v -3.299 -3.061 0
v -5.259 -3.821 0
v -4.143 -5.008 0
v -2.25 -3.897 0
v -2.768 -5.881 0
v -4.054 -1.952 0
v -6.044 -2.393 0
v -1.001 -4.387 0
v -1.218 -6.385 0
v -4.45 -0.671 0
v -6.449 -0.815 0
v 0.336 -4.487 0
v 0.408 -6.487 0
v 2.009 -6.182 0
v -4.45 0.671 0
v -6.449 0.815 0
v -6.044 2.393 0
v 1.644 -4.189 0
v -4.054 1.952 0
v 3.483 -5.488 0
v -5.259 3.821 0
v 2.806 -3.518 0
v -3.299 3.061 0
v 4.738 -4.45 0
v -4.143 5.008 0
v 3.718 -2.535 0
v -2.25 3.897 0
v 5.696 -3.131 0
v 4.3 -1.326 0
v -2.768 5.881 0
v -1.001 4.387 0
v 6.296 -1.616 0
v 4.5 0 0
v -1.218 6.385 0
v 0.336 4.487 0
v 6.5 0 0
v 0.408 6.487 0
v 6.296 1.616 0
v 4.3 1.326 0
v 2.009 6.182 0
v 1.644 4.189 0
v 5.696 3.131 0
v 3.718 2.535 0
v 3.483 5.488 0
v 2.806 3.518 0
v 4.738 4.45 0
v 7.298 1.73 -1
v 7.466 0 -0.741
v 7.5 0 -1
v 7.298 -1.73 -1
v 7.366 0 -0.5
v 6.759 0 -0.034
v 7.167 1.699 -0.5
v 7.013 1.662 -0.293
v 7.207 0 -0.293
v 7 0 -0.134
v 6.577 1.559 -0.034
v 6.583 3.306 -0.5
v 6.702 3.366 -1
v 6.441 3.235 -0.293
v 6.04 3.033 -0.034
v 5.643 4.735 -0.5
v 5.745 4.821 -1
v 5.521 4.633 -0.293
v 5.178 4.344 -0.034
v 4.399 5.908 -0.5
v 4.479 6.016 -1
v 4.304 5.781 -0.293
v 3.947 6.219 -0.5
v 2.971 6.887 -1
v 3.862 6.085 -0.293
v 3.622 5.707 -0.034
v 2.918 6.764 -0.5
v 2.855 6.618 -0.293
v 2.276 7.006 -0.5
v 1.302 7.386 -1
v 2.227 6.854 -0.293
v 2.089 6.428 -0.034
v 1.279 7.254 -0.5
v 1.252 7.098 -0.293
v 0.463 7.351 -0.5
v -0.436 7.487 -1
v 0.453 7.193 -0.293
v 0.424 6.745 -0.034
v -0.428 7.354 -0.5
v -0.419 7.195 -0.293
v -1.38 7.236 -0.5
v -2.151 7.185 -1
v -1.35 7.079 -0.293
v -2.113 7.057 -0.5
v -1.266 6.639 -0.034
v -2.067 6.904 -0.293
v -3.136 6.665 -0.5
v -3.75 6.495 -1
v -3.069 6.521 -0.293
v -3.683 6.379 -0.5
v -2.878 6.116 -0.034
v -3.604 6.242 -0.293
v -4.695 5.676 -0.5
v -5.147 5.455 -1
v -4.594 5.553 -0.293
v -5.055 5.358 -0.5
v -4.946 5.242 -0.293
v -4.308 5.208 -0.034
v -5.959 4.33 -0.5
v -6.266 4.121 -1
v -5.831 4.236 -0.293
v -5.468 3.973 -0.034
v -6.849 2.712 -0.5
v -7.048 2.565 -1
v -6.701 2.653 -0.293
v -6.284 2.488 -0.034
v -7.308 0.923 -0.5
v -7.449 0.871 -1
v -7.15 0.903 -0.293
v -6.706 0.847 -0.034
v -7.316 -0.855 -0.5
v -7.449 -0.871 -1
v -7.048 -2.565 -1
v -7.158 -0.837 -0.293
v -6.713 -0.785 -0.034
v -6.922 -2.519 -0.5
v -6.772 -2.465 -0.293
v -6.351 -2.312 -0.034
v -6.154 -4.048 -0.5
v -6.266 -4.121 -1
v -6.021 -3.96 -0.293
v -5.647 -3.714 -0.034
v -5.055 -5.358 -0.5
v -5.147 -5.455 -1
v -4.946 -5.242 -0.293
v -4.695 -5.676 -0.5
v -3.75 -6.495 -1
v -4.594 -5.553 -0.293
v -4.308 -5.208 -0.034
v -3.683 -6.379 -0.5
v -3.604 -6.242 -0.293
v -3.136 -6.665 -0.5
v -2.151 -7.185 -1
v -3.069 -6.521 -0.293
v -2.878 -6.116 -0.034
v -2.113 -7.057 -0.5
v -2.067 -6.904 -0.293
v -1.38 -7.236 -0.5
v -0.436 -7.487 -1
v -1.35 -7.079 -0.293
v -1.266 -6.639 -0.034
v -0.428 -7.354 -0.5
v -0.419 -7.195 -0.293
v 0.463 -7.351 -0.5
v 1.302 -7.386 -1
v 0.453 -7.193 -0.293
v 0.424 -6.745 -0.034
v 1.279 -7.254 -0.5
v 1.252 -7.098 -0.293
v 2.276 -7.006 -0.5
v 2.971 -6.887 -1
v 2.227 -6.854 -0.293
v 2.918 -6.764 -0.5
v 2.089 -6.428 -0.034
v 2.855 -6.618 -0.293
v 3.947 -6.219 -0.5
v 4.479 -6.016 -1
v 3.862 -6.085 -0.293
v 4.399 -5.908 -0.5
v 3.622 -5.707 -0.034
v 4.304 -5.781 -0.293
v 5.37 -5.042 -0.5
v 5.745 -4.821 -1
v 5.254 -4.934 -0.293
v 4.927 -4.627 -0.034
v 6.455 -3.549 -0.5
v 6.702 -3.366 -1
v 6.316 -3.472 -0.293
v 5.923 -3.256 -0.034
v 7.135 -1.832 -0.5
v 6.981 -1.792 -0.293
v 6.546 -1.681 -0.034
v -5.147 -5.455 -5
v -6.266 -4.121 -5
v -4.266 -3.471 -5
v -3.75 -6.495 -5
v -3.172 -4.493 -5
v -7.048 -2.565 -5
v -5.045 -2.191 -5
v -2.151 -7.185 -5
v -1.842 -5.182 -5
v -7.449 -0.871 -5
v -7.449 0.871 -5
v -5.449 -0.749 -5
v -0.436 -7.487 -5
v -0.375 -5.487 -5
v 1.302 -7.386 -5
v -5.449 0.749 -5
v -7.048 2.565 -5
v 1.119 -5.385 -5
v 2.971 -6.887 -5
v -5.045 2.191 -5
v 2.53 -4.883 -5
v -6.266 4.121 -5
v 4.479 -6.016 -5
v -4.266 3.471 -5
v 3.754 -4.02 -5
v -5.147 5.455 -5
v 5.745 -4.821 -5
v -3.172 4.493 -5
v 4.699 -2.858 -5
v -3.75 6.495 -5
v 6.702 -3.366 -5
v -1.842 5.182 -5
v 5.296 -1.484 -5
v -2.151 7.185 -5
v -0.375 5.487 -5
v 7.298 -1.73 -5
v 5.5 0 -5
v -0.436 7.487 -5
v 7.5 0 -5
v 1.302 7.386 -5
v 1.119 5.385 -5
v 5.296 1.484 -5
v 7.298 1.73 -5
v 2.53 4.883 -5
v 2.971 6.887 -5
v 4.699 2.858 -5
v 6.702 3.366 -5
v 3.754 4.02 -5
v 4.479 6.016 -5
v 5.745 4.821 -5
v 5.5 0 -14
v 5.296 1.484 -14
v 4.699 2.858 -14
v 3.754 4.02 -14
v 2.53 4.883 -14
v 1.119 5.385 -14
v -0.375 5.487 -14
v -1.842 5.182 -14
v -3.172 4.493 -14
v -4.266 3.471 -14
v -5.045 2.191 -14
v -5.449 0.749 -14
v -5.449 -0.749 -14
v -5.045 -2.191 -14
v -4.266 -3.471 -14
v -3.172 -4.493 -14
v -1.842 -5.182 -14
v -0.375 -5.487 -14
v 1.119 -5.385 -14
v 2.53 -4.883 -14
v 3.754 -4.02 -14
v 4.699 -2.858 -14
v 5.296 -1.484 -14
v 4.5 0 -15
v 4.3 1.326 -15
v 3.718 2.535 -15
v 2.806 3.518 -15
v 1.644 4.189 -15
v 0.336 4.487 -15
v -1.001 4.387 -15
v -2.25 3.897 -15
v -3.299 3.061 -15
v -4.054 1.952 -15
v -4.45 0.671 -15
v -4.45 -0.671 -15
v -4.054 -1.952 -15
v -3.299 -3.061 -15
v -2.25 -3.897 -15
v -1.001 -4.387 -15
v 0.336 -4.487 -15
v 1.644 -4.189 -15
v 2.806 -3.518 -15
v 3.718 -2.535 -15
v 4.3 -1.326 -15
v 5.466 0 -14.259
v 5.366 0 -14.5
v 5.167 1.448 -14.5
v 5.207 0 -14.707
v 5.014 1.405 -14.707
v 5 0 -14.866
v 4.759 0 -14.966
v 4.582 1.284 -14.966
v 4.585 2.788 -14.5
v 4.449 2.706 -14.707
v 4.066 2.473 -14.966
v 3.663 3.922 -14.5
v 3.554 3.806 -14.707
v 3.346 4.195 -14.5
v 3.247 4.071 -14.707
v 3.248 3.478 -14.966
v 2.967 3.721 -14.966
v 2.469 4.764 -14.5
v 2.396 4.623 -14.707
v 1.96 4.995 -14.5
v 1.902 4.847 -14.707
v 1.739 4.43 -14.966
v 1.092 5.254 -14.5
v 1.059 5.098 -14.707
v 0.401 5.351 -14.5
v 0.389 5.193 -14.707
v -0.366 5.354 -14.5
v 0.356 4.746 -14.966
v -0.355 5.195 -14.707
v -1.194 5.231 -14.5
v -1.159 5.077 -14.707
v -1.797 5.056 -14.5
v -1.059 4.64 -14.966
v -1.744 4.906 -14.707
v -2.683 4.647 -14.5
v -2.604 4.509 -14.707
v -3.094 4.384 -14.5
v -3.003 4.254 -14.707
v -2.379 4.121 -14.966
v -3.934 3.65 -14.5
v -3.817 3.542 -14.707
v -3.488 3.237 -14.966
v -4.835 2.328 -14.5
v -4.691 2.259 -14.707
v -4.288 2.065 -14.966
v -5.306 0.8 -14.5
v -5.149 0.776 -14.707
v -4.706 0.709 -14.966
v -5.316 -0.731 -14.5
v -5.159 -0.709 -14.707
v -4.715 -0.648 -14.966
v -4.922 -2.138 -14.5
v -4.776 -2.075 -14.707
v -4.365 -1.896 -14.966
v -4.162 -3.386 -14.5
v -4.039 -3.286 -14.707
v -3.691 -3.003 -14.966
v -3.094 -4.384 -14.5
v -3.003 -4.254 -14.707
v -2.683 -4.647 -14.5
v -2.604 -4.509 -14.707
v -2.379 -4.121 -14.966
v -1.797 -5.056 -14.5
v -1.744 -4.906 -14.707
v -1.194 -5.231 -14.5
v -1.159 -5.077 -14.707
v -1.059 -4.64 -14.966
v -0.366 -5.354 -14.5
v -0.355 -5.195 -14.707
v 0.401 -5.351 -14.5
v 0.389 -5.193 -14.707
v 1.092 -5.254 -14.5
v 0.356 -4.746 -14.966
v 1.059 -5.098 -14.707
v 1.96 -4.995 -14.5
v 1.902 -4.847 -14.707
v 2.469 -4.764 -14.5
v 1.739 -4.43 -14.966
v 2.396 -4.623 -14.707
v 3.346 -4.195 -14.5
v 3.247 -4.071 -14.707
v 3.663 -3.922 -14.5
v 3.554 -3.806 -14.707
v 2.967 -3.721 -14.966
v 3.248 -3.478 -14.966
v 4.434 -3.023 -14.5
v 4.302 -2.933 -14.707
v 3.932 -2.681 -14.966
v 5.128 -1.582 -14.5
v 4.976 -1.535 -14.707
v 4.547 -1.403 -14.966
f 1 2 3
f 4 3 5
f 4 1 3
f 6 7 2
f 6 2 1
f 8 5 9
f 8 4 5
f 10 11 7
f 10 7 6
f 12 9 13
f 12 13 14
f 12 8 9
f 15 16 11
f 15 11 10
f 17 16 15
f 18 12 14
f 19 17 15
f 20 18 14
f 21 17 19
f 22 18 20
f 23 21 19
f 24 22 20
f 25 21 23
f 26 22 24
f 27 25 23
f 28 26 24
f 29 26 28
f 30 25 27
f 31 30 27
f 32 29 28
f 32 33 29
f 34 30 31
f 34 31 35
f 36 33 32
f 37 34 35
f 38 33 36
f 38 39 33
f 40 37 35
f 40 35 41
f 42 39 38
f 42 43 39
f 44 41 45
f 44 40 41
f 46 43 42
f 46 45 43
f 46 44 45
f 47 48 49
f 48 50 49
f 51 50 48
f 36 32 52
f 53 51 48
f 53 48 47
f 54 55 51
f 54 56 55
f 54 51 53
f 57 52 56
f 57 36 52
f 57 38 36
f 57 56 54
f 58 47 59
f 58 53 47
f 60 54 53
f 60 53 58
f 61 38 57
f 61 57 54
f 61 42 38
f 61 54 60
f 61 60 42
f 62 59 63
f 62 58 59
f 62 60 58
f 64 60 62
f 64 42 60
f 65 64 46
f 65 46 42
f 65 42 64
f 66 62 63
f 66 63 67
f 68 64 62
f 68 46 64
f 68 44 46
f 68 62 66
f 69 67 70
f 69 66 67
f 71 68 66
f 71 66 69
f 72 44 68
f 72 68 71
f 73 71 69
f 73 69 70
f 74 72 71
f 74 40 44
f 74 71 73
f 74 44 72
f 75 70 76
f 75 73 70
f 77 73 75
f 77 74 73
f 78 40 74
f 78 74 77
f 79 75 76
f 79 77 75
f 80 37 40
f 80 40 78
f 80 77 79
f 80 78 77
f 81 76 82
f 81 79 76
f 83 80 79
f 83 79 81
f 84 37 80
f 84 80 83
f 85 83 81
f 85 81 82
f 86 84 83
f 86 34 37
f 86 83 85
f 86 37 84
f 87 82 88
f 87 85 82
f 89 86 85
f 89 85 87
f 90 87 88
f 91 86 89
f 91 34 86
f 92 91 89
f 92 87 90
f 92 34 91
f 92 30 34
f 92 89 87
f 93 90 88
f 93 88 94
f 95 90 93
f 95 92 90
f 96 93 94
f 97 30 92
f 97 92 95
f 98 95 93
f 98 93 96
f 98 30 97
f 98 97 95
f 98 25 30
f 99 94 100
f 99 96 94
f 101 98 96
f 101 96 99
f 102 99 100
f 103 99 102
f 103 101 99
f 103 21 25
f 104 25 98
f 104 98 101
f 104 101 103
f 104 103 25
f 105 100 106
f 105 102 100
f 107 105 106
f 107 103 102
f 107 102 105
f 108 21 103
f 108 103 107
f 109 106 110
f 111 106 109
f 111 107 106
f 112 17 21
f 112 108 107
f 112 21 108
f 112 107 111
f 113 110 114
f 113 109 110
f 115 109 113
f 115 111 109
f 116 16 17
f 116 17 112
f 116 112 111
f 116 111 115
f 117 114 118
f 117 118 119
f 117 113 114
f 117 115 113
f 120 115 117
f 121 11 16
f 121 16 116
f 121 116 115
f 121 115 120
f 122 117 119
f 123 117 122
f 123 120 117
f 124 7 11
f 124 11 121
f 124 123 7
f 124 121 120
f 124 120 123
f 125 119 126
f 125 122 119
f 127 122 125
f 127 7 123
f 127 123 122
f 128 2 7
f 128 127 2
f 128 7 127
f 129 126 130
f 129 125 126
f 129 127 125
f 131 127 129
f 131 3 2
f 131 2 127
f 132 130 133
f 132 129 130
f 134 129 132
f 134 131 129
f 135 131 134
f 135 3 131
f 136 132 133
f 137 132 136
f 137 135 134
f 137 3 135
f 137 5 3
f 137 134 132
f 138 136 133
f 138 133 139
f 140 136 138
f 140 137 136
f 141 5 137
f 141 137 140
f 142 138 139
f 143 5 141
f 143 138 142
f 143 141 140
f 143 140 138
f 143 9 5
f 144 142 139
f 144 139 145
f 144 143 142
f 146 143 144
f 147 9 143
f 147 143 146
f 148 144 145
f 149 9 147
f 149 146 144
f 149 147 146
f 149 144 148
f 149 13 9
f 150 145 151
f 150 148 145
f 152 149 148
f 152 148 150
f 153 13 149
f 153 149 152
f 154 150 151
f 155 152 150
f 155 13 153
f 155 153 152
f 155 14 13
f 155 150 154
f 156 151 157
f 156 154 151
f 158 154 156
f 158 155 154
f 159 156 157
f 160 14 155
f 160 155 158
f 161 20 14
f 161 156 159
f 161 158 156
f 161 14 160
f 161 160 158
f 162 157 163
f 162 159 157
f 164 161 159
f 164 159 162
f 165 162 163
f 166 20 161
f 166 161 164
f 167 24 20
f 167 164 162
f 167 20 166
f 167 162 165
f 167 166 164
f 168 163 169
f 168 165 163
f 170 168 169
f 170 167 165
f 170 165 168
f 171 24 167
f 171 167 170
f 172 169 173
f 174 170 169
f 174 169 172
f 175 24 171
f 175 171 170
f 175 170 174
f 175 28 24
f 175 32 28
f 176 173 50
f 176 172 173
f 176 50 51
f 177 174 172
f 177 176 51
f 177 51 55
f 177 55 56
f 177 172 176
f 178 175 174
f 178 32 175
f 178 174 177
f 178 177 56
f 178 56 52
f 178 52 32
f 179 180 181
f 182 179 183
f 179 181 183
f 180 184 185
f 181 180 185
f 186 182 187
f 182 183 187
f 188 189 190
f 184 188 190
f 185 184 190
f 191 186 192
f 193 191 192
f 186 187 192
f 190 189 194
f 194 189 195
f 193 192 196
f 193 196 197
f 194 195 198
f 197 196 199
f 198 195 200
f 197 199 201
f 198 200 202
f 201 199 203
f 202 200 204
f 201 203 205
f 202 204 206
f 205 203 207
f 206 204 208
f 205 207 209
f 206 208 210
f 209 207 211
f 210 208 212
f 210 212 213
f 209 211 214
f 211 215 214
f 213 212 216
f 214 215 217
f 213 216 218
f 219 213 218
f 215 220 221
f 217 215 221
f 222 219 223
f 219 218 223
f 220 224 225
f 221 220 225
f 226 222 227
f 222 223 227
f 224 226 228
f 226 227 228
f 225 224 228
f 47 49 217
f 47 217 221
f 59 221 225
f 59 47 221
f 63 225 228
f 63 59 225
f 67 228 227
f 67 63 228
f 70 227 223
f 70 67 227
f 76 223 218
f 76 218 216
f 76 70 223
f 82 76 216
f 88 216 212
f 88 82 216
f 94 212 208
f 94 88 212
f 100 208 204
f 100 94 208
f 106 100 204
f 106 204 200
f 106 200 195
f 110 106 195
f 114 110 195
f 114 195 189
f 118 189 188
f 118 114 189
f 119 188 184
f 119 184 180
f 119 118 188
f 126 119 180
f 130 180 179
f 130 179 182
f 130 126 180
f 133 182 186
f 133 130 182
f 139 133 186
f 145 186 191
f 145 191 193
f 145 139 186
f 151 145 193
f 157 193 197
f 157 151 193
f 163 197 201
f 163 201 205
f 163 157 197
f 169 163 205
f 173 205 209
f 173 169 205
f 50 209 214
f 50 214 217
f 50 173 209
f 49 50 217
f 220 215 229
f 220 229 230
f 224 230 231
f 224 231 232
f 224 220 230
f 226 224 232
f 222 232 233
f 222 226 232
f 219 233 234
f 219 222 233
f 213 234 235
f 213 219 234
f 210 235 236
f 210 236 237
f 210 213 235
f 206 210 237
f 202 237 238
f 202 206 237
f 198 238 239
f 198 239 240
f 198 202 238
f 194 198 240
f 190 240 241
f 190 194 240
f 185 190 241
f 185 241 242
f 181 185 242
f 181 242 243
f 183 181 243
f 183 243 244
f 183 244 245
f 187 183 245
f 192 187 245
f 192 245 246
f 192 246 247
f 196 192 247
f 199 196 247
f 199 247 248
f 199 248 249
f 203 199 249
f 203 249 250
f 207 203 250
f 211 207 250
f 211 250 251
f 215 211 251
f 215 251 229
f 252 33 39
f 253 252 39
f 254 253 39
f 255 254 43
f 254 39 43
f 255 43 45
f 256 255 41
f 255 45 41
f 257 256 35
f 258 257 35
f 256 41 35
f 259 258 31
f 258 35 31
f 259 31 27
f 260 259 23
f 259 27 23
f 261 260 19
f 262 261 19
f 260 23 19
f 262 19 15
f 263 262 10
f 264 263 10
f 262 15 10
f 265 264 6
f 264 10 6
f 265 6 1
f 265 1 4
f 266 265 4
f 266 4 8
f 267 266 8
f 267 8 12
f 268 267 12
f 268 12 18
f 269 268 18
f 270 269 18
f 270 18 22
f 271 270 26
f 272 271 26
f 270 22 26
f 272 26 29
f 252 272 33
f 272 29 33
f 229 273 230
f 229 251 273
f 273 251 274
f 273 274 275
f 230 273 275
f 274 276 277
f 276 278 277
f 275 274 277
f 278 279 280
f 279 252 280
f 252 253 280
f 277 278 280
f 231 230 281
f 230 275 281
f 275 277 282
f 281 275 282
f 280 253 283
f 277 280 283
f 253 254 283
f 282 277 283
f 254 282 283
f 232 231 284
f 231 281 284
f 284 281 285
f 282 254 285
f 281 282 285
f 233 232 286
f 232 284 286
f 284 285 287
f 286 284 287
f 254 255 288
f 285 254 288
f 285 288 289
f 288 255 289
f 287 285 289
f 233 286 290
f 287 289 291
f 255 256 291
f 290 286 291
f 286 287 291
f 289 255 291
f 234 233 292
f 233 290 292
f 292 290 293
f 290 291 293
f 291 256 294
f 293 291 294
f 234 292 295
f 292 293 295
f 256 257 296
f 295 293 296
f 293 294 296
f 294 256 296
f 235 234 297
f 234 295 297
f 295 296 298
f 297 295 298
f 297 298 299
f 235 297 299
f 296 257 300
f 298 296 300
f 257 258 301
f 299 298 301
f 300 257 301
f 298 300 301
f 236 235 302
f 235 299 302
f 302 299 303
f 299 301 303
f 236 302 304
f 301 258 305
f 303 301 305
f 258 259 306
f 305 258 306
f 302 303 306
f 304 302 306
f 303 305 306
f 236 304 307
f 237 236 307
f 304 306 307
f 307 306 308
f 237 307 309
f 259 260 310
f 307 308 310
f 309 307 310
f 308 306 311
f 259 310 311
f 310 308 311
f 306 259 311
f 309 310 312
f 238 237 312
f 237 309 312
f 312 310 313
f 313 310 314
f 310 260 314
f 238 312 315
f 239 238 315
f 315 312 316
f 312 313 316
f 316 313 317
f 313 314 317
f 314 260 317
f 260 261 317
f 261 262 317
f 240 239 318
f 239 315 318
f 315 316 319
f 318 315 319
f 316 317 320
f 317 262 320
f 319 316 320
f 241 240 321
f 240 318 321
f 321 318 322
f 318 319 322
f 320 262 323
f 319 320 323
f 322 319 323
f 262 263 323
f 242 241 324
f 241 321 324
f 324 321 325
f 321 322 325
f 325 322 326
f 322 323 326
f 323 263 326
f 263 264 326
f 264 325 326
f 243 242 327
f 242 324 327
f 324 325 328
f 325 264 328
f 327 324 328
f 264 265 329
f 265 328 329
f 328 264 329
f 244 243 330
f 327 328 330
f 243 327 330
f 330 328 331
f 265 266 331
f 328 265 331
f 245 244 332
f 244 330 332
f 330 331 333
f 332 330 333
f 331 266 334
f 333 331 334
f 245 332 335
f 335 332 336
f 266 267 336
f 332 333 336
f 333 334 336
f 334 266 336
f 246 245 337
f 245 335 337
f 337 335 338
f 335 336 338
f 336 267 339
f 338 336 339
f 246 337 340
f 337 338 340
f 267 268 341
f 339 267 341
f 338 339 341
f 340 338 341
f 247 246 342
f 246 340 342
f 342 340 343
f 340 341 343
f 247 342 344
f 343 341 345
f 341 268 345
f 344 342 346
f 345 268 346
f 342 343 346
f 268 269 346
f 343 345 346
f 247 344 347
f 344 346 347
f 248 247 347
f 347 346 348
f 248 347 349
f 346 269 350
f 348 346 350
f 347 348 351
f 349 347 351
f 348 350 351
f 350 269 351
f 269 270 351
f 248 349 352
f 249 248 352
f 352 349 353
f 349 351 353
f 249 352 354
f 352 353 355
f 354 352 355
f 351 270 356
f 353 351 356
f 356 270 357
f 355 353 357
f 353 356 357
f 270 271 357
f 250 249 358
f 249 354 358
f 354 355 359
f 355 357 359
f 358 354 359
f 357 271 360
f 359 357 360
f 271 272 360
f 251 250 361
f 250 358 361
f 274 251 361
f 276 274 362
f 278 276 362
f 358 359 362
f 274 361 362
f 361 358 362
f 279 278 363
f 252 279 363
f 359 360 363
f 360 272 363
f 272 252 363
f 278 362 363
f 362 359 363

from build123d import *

# Parameters (mm, degrees)
F0_R     = 5.5
F0_R_2   = 4.5
F1_DEPTH = 15
F0_R_3   = 7.5
F2_DEPTH = 5
F3_R     = 0.99999


# Not quite as in the source:
# - a fillet or chamfer is up to 0.001 mm smaller than in the source, because OpenCascade refuses the exact size


with BuildPart() as f1:
    # F0 (on Top) → F1 (new body)
    with BuildSketch(Plane.XY):
        Circle(F0_R)
        Circle(F0_R_2, mode=Mode.SUBTRACT)
    extrude(amount=-F1_DEPTH)

    # F0 (on Top) → F2 (join)
    with BuildSketch(Plane.XY):
        Circle(F0_R_3)
        Circle(F0_R, mode=Mode.SUBTRACT)
    extrude(amount=-F2_DEPTH)

    # F3 (radius 1 in the source; OpenCascade refuses exactly that, so slightly less here)
    f3_edges = [f1.edges().sort_by_distance(p)[0] for p in [
        (-7.5, 0, 0),
        (-5.5, 0, -15),
    ]]
    fillet(f3_edges, radius=F3_R)


solid = f1.part
